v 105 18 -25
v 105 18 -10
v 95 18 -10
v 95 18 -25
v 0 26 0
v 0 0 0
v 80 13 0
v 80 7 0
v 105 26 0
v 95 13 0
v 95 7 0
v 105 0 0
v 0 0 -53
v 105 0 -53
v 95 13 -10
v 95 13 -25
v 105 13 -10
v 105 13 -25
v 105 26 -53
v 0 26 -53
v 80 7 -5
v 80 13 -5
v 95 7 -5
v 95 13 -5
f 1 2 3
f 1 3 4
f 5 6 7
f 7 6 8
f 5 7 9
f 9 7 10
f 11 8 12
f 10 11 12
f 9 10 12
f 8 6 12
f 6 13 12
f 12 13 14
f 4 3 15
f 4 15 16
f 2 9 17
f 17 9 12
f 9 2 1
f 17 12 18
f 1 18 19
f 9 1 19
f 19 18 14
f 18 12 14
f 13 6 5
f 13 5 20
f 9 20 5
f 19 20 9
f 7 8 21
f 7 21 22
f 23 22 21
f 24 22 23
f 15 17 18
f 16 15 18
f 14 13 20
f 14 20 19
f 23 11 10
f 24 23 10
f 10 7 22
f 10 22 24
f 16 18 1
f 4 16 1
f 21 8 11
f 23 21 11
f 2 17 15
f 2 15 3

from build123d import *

# Parameters (mm, degrees)
SKETCH2_W           = 105
SKETCH2_H           = 53
BOSS_EXTRUDE1_DEPTH = 26
SKETCH3_W           = 15
SKETCH3_H           = 6
CUT_EXTRUDE1_DEPTH  = 5
SKETCH4_W           = 15
SKETCH4_H           = 5
CUT_EXTRUDE2_DEPTH  = 10


with BuildPart() as part:
    # Sketch2 → Boss-Extrude1 (new body)
    with BuildSketch(Plane(origin=(0, 0, 0), x_dir=(1, 0, 0), z_dir=(0, 1, 0))):
        with Locations((52.5, 26.5)):
            Rectangle(SKETCH2_W, SKETCH2_H)
    extrude(amount=BOSS_EXTRUDE1_DEPTH)

    # Sketch3 → Cut-Extrude1 (cut)
    with BuildSketch(Plane.XY):
        with Locations((87.5, 10)):
            Rectangle(SKETCH3_W, SKETCH3_H)
    extrude(amount=-CUT_EXTRUDE1_DEPTH, mode=Mode.SUBTRACT)

    # Sketch4 → Cut-Extrude2 (cut)
    with BuildSketch(Plane(origin=(105, 0, 0), x_dir=(0, 0, -1), z_dir=(1, 0, 0))):
        with Locations((17.5, 15.5)):
            Rectangle(SKETCH4_W, SKETCH4_H)
    extrude(amount=-CUT_EXTRUDE2_DEPTH, mode=Mode.SUBTRACT)


solid = part.part
